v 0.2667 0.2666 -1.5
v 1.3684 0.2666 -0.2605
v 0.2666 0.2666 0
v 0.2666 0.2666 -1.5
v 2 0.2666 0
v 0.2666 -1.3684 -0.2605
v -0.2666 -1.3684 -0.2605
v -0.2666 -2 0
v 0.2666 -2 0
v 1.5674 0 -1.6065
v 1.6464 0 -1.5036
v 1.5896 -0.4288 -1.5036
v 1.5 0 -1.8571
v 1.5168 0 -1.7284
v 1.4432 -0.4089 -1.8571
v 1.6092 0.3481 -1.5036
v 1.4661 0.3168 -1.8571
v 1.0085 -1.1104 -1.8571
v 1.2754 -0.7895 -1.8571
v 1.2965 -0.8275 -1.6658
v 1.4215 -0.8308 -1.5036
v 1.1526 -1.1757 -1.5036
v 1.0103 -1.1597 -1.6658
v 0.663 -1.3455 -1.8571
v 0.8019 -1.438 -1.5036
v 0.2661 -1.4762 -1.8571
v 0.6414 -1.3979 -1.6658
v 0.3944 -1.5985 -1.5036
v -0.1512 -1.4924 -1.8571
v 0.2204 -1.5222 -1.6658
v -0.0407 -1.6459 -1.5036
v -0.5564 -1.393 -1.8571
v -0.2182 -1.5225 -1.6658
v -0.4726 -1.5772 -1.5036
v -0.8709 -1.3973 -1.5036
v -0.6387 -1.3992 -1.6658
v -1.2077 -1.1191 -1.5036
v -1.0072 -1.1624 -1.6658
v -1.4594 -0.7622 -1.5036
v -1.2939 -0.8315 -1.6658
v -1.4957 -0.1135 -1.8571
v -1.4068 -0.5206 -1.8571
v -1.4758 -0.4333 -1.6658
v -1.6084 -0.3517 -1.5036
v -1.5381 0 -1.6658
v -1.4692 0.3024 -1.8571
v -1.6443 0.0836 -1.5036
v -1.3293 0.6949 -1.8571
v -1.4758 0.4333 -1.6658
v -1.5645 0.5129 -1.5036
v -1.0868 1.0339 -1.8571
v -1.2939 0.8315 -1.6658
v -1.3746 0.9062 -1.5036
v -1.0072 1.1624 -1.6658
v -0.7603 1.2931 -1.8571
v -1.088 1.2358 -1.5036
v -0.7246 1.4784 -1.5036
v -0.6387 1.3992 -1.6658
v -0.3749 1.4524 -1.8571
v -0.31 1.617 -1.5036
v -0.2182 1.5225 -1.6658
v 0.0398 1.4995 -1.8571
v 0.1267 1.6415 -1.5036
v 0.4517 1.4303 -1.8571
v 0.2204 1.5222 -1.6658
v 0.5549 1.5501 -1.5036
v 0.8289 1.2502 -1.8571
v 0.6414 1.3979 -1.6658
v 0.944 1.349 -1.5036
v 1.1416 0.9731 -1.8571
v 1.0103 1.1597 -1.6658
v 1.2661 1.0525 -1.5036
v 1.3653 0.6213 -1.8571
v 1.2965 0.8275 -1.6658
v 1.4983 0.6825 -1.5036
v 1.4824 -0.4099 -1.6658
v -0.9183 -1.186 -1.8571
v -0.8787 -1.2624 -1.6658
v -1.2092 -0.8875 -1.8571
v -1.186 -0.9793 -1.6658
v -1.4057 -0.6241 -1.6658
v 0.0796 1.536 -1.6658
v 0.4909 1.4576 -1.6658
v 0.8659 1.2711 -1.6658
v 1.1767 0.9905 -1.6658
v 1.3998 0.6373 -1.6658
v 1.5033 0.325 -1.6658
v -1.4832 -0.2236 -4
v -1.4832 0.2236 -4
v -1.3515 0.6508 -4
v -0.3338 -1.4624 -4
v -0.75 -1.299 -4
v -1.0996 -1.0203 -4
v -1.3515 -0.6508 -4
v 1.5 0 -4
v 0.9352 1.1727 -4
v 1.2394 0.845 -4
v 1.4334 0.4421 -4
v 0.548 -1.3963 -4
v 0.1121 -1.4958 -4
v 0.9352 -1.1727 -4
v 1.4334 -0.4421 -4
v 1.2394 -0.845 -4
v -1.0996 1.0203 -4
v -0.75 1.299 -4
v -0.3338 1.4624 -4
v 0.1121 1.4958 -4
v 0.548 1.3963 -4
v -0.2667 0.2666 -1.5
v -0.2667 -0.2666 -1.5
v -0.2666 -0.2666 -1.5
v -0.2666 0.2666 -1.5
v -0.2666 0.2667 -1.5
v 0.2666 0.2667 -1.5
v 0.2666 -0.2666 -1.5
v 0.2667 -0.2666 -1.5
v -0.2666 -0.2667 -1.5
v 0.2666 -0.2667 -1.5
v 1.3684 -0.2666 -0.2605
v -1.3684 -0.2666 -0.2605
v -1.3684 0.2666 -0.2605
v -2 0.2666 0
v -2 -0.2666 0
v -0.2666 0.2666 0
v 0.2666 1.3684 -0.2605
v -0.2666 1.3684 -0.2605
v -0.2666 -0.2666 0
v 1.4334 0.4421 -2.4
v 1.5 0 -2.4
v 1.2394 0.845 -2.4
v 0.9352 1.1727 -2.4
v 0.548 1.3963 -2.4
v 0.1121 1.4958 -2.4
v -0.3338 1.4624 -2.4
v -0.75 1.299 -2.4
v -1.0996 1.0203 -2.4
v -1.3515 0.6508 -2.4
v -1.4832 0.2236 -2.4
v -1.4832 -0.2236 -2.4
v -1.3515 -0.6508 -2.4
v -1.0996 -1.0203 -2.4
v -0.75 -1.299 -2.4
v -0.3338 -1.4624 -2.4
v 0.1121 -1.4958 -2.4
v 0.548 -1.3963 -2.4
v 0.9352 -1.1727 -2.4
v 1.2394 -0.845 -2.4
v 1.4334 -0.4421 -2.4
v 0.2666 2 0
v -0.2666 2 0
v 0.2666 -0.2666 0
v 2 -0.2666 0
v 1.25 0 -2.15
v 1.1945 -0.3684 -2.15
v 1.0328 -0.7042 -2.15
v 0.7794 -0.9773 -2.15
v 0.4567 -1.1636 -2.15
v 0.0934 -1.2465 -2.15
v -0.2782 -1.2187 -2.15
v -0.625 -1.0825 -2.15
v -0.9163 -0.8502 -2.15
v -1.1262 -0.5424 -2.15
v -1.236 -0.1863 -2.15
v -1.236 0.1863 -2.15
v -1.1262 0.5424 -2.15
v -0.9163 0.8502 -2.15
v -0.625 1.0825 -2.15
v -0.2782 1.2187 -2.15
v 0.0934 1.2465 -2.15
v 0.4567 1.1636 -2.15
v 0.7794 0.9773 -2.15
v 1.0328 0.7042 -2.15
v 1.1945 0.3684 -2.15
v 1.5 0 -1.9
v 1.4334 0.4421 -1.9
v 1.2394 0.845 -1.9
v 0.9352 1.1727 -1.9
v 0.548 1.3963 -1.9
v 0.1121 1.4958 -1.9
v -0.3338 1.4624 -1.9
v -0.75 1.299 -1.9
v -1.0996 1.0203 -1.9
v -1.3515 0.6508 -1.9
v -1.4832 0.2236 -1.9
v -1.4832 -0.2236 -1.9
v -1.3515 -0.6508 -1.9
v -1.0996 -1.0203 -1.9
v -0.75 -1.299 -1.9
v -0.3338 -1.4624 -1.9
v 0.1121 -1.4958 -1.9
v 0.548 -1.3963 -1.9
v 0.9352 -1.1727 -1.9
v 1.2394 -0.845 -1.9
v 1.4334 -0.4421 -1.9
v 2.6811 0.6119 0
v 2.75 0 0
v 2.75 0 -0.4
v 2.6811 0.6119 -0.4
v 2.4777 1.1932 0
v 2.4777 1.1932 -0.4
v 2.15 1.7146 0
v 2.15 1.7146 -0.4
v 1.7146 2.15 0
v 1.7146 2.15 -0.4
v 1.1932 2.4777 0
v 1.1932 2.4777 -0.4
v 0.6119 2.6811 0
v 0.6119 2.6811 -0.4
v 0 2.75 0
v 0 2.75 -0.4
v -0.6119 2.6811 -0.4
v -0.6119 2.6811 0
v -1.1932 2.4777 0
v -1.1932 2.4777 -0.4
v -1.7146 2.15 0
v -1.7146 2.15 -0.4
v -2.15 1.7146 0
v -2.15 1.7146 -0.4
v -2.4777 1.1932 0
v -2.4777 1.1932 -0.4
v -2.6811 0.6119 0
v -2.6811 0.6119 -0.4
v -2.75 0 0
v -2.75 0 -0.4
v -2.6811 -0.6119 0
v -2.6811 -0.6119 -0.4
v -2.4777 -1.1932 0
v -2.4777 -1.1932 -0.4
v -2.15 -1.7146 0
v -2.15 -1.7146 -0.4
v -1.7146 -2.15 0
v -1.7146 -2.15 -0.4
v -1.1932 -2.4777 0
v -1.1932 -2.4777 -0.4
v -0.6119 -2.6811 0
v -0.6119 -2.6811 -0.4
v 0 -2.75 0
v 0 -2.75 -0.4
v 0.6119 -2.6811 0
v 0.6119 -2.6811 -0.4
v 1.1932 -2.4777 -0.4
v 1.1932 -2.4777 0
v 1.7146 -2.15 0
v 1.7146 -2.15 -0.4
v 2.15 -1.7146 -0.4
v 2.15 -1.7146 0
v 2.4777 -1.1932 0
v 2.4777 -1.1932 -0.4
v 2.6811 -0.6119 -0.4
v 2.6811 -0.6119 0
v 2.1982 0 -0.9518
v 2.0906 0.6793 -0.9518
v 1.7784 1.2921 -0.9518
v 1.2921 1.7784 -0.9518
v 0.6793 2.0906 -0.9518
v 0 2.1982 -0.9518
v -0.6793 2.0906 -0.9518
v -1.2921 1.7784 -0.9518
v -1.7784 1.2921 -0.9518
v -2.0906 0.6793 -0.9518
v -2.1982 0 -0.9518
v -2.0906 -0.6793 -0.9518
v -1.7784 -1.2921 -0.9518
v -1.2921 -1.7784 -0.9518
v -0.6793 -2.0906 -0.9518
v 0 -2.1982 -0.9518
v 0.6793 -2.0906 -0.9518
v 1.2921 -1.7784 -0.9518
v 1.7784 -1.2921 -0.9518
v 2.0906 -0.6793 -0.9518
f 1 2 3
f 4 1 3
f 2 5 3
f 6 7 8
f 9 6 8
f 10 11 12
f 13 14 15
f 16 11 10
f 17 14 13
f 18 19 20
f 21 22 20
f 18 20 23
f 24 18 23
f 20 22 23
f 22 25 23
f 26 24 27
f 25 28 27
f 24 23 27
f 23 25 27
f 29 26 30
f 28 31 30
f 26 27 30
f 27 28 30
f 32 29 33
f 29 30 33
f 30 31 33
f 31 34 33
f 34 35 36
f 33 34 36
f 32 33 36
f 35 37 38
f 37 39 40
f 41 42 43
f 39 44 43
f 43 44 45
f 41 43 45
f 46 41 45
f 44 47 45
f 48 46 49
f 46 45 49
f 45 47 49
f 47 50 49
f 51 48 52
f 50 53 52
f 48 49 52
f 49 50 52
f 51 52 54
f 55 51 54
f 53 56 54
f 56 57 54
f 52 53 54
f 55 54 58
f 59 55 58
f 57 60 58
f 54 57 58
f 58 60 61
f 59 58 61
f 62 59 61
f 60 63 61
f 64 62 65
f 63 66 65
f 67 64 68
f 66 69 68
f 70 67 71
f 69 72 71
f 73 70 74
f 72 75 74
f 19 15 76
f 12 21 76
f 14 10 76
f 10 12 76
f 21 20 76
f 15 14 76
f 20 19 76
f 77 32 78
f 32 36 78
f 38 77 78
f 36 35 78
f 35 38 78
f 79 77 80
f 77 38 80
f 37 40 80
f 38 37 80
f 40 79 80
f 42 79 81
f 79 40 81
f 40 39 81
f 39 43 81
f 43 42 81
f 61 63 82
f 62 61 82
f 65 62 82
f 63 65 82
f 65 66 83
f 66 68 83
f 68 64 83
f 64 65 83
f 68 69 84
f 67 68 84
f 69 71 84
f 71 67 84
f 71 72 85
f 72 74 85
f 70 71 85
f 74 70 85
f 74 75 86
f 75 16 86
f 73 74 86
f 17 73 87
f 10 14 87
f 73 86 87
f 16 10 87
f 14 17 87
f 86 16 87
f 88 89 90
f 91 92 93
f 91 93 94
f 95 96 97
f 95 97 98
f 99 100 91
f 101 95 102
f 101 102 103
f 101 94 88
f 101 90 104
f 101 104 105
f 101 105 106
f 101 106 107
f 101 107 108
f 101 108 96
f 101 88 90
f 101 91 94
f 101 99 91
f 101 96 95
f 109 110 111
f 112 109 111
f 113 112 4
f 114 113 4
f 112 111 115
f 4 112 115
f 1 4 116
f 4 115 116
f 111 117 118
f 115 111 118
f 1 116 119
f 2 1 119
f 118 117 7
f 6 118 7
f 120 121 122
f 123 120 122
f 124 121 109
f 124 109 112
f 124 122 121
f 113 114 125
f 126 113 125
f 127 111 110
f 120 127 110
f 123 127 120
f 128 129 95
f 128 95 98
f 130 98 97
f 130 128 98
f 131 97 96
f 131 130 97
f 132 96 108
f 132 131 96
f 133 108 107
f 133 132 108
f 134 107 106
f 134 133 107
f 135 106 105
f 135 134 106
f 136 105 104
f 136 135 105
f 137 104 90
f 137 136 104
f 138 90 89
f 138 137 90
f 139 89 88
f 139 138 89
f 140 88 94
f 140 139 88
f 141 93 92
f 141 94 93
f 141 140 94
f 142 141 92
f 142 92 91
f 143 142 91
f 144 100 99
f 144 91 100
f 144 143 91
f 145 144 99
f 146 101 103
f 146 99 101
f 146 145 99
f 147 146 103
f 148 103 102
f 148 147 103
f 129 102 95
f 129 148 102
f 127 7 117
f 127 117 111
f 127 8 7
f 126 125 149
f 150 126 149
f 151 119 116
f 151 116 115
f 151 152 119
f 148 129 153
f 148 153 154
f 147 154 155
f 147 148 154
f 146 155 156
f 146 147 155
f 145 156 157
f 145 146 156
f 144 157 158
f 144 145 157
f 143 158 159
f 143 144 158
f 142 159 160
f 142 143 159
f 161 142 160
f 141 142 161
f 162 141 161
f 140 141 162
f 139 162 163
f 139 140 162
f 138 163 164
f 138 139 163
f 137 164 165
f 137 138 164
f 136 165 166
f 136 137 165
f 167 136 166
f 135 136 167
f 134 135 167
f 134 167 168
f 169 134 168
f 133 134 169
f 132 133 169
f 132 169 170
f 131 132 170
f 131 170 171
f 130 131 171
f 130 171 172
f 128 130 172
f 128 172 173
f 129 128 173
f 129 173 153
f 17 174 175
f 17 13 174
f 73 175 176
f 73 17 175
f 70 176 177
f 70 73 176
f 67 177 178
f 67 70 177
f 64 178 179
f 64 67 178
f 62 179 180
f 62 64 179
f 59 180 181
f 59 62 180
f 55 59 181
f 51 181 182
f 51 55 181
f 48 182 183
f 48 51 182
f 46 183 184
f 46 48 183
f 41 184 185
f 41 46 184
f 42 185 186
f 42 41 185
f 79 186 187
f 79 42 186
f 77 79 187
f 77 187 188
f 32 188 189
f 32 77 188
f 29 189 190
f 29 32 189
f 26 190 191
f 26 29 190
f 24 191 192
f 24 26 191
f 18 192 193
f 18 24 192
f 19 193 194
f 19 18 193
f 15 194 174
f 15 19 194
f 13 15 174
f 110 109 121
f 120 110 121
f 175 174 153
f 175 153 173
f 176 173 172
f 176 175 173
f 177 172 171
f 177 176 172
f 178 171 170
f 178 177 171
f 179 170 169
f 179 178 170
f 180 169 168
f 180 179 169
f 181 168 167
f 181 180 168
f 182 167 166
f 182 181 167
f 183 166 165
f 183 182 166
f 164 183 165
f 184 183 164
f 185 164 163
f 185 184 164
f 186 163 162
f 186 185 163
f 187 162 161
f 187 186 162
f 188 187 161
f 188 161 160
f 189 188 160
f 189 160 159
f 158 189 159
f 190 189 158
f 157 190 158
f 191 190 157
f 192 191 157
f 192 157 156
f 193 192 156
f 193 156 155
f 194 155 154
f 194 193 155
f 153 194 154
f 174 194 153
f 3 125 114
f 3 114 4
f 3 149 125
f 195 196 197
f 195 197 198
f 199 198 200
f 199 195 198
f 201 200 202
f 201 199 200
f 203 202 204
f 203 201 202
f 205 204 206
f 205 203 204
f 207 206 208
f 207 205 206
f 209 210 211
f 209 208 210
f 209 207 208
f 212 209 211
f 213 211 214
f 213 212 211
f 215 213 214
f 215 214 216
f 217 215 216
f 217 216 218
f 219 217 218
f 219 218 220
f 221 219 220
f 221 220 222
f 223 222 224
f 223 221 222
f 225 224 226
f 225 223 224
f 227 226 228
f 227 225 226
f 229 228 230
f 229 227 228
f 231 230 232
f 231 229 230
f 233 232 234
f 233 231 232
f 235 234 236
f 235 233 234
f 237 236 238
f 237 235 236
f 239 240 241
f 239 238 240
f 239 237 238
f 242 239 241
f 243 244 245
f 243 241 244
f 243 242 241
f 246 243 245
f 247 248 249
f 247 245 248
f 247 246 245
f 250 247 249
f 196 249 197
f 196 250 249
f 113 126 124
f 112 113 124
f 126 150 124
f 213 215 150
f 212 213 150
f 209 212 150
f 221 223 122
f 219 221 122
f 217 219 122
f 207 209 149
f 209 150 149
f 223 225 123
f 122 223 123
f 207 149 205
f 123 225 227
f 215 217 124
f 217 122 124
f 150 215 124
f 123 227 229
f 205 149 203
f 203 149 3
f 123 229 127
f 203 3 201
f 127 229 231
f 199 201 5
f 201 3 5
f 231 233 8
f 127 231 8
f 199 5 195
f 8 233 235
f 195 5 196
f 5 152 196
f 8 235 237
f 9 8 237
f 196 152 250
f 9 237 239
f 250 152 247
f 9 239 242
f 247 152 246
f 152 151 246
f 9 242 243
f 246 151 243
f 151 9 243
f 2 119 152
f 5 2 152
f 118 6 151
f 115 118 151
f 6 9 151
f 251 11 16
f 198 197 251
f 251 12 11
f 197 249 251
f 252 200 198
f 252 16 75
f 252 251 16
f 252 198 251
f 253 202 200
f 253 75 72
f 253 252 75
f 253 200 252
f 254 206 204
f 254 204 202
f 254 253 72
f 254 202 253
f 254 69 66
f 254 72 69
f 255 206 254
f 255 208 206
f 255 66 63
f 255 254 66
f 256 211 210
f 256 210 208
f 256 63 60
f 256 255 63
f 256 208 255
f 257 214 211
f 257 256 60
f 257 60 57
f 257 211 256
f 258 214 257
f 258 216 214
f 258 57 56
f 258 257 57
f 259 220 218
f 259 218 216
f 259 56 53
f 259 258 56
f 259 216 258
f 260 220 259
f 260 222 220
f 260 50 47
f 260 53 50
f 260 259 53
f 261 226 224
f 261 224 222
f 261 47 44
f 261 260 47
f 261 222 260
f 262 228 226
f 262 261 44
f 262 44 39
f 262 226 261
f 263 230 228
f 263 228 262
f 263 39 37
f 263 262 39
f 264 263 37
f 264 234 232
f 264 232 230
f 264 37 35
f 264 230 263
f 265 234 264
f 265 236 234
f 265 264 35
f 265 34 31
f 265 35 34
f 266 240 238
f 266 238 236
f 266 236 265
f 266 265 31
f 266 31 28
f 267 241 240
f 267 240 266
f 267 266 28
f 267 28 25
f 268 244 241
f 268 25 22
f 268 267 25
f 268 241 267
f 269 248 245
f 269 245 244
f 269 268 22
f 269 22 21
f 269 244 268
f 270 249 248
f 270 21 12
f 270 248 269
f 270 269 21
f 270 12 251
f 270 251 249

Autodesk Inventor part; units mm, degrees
ref_plane "YZ Plane" through (0, 0, 0) normal (1, 0, 0) x (0, 1, 0)
sketch "Esquisse1" plane through (0, 0, 0) normal (0, 1, 0) x (-1, 0, 0)
  point P0 (0, 0)
sketch "Esquisse2" plane through (0, 0, 0) normal (0, 0, 1) x (1, 0, 0)
  point P0 (0, 0)
sketch "Esquisse3" plane through (0, 0, 0) normal (0, 0, 1) x (1, 0, 0)
  point P0 (0, 0)
sketch "Esquisse4" plane through (0, 0, 0) normal (0, 1, 0) x (-1, 0, 0)
  line L0 (-2.75, 0) -> (0, 0)
  line L1 (-2.75, -0.4) -> (-2.75, 0)
  line L2 (-1.5, -1.65) -> (-2.75, -0.4)
  line L3 (-1.5, -1.9) -> (-1.5, -1.65)
  line L4 (-1.25, -2.15) -> (-1.5, -1.9)
  line L5 (-1.5, -2.4) -> (-1.25, -2.15)
  line L6 (-1.5, -4) -> (-1.5, -2.4)
  line L7 (0, 0) -> (0, -4)
  line L8 (0, 3.3392) -> (0, -10.7) construction
  line L9 (0, 3.3392) -> (0, -10.7)
  line L10 (0, -13.5078) -> (0, 6.1471) projected
  line L11 (-1.5, -4) -> (0, -4)
  line L12 (0.55, 0) -> (-3.3, 0) projected
  dimension "d3" = 2.75
  dimension "d5" = 0.25
  dimension "d7" = 0.25
  dimension "d9" = 0.25
  dimension "d11" = 1.65
  dimension "d13" = 135
  dimension "d17" = 1.25
  dimension "d19" = 0
  dimension "d51" = 1.5
  dimension "d52" = 4
revolve "Révolution1" add sketch "Esquisse4" angle 360 about axis through (0, 0, 3.3392) along (0, 0, -1)
sketch "Esquisse5" plane through (0, 0, 0) normal (0, 1, 0) x (-1, 0, 0)
  line L0 (-1.6, 0) -> (0, 0)
  line L1 (-0.2667, -1.5) -> (-1.6, 0)
  line L2 (0, -1.5) -> (-0.2667, -1.5)
  line L3 (0, 0) -> (0, -1.5)
  line L4 (-1.5, -1.65) -> (1.5, -1.65) construction
  line L5 (-2.75, 0) -> (2.75, 0) projected
  line L6 (0, -1.98) -> (0, 0.33) projected
  dimension "d22" = 1.6
  dimension "d24" = 0.2667
  dimension "d26" = 1.5
extrude "Extrusion1" cut sketch "Esquisse5" along normal mid plane 0.5333
pattern_circular "RéseauPolaire1" count 4 over 360 about axis through (0, 0, 0) along (0, 0, 1) of "Extrusion1"
sketch "Esquisse7" plane through (0, 0, 0) normal (0, 1, 0) x (-1, 0, 0)
  line L0 (0, -0.825) -> (-2, 0)
  line L1 (0, 0) -> (0, -0.825)
  line L2 (-2, 0) -> (0, 0)
  line L3 (-1.5, -1.65) -> (1.5, -1.65) construction
  line L4 (0, -1.98) -> (0, 0.33) projected
  line L5 (-2.75, 0) -> (2.75, 0) projected
  dimension "d33" = 2
  dimension "d35" = 0.825
extrude "Extrusion2" cut sketch "Esquisse7" along normal mid plane 0.5333
pattern_circular "RéseauPolaire2" count 4 over 360 about axis through (0, 0, 0) along (0, 0, 1) of "Extrusion2"
fillet "Congé1" radius 0.5 1 edges at (-1.5, 0, -1.65)
thread "Filetage1" size "M3x0.5" class "6g" standard "ISO Metric profile" full length
ref_plane "MSC_PF1" through (0, 0, 0) normal (1, 0, 0) x (0, 1, 0)
ref_plane "MSC_PT1" through (0, 0, 0) normal (0, 0, -1) x (-1, 0, 0)
equation "\"d3\" = 0.5 * Dh"
equation "\"d5\" = msp_x"
equation "\"d7\" = ParA"
equation "\"d9\" = msp_x"
equation "\"d11\" = ParK"
equation "\"d17\" = 0.5 * msp_mdtds"
equation "\"d51\" = 0.5 * NND"
equation "\"d52\" = NLG"
equation "\"d22\" = 0.5 * M"
equation "\"d24\" = 0.0833333 * M"
equation "\"d26\" = 0.909091 * ParK"
equation "\"d27\" = 0.166667 * M"
equation "\"d33\" = 0.625 * M"
equation "\"d35\" = 0.5 * ParK"
equation "\"d36\" = 0.166667 * M"
equation "\"d41\" = 2 * msp_x"
equation "\"PTC\" = 0.5"
equation "\"NLG\" = 4"
equation "\"ParK\" = 1.65"
equation "\"NND\" = 3"
equation "\"M\" = 3.2"
equation "\"msp_mdtds\" = NND - PTC"
equation "\"Dh\" = 5.5"
equation "\"msp_x\" = 0.5 * PTC"
equation "\"ParA\" = 0.5 * PTC"
equation "\"r\" = 0.8"
equation "\"THREADDIA\" = NND"
equation "\"TEMPLATE\" = 1.2345"
properties part number "NF EN ISO 7046-2 H - M3x4 - 8.8 - H1" material "Acier inoxydable 440C"
